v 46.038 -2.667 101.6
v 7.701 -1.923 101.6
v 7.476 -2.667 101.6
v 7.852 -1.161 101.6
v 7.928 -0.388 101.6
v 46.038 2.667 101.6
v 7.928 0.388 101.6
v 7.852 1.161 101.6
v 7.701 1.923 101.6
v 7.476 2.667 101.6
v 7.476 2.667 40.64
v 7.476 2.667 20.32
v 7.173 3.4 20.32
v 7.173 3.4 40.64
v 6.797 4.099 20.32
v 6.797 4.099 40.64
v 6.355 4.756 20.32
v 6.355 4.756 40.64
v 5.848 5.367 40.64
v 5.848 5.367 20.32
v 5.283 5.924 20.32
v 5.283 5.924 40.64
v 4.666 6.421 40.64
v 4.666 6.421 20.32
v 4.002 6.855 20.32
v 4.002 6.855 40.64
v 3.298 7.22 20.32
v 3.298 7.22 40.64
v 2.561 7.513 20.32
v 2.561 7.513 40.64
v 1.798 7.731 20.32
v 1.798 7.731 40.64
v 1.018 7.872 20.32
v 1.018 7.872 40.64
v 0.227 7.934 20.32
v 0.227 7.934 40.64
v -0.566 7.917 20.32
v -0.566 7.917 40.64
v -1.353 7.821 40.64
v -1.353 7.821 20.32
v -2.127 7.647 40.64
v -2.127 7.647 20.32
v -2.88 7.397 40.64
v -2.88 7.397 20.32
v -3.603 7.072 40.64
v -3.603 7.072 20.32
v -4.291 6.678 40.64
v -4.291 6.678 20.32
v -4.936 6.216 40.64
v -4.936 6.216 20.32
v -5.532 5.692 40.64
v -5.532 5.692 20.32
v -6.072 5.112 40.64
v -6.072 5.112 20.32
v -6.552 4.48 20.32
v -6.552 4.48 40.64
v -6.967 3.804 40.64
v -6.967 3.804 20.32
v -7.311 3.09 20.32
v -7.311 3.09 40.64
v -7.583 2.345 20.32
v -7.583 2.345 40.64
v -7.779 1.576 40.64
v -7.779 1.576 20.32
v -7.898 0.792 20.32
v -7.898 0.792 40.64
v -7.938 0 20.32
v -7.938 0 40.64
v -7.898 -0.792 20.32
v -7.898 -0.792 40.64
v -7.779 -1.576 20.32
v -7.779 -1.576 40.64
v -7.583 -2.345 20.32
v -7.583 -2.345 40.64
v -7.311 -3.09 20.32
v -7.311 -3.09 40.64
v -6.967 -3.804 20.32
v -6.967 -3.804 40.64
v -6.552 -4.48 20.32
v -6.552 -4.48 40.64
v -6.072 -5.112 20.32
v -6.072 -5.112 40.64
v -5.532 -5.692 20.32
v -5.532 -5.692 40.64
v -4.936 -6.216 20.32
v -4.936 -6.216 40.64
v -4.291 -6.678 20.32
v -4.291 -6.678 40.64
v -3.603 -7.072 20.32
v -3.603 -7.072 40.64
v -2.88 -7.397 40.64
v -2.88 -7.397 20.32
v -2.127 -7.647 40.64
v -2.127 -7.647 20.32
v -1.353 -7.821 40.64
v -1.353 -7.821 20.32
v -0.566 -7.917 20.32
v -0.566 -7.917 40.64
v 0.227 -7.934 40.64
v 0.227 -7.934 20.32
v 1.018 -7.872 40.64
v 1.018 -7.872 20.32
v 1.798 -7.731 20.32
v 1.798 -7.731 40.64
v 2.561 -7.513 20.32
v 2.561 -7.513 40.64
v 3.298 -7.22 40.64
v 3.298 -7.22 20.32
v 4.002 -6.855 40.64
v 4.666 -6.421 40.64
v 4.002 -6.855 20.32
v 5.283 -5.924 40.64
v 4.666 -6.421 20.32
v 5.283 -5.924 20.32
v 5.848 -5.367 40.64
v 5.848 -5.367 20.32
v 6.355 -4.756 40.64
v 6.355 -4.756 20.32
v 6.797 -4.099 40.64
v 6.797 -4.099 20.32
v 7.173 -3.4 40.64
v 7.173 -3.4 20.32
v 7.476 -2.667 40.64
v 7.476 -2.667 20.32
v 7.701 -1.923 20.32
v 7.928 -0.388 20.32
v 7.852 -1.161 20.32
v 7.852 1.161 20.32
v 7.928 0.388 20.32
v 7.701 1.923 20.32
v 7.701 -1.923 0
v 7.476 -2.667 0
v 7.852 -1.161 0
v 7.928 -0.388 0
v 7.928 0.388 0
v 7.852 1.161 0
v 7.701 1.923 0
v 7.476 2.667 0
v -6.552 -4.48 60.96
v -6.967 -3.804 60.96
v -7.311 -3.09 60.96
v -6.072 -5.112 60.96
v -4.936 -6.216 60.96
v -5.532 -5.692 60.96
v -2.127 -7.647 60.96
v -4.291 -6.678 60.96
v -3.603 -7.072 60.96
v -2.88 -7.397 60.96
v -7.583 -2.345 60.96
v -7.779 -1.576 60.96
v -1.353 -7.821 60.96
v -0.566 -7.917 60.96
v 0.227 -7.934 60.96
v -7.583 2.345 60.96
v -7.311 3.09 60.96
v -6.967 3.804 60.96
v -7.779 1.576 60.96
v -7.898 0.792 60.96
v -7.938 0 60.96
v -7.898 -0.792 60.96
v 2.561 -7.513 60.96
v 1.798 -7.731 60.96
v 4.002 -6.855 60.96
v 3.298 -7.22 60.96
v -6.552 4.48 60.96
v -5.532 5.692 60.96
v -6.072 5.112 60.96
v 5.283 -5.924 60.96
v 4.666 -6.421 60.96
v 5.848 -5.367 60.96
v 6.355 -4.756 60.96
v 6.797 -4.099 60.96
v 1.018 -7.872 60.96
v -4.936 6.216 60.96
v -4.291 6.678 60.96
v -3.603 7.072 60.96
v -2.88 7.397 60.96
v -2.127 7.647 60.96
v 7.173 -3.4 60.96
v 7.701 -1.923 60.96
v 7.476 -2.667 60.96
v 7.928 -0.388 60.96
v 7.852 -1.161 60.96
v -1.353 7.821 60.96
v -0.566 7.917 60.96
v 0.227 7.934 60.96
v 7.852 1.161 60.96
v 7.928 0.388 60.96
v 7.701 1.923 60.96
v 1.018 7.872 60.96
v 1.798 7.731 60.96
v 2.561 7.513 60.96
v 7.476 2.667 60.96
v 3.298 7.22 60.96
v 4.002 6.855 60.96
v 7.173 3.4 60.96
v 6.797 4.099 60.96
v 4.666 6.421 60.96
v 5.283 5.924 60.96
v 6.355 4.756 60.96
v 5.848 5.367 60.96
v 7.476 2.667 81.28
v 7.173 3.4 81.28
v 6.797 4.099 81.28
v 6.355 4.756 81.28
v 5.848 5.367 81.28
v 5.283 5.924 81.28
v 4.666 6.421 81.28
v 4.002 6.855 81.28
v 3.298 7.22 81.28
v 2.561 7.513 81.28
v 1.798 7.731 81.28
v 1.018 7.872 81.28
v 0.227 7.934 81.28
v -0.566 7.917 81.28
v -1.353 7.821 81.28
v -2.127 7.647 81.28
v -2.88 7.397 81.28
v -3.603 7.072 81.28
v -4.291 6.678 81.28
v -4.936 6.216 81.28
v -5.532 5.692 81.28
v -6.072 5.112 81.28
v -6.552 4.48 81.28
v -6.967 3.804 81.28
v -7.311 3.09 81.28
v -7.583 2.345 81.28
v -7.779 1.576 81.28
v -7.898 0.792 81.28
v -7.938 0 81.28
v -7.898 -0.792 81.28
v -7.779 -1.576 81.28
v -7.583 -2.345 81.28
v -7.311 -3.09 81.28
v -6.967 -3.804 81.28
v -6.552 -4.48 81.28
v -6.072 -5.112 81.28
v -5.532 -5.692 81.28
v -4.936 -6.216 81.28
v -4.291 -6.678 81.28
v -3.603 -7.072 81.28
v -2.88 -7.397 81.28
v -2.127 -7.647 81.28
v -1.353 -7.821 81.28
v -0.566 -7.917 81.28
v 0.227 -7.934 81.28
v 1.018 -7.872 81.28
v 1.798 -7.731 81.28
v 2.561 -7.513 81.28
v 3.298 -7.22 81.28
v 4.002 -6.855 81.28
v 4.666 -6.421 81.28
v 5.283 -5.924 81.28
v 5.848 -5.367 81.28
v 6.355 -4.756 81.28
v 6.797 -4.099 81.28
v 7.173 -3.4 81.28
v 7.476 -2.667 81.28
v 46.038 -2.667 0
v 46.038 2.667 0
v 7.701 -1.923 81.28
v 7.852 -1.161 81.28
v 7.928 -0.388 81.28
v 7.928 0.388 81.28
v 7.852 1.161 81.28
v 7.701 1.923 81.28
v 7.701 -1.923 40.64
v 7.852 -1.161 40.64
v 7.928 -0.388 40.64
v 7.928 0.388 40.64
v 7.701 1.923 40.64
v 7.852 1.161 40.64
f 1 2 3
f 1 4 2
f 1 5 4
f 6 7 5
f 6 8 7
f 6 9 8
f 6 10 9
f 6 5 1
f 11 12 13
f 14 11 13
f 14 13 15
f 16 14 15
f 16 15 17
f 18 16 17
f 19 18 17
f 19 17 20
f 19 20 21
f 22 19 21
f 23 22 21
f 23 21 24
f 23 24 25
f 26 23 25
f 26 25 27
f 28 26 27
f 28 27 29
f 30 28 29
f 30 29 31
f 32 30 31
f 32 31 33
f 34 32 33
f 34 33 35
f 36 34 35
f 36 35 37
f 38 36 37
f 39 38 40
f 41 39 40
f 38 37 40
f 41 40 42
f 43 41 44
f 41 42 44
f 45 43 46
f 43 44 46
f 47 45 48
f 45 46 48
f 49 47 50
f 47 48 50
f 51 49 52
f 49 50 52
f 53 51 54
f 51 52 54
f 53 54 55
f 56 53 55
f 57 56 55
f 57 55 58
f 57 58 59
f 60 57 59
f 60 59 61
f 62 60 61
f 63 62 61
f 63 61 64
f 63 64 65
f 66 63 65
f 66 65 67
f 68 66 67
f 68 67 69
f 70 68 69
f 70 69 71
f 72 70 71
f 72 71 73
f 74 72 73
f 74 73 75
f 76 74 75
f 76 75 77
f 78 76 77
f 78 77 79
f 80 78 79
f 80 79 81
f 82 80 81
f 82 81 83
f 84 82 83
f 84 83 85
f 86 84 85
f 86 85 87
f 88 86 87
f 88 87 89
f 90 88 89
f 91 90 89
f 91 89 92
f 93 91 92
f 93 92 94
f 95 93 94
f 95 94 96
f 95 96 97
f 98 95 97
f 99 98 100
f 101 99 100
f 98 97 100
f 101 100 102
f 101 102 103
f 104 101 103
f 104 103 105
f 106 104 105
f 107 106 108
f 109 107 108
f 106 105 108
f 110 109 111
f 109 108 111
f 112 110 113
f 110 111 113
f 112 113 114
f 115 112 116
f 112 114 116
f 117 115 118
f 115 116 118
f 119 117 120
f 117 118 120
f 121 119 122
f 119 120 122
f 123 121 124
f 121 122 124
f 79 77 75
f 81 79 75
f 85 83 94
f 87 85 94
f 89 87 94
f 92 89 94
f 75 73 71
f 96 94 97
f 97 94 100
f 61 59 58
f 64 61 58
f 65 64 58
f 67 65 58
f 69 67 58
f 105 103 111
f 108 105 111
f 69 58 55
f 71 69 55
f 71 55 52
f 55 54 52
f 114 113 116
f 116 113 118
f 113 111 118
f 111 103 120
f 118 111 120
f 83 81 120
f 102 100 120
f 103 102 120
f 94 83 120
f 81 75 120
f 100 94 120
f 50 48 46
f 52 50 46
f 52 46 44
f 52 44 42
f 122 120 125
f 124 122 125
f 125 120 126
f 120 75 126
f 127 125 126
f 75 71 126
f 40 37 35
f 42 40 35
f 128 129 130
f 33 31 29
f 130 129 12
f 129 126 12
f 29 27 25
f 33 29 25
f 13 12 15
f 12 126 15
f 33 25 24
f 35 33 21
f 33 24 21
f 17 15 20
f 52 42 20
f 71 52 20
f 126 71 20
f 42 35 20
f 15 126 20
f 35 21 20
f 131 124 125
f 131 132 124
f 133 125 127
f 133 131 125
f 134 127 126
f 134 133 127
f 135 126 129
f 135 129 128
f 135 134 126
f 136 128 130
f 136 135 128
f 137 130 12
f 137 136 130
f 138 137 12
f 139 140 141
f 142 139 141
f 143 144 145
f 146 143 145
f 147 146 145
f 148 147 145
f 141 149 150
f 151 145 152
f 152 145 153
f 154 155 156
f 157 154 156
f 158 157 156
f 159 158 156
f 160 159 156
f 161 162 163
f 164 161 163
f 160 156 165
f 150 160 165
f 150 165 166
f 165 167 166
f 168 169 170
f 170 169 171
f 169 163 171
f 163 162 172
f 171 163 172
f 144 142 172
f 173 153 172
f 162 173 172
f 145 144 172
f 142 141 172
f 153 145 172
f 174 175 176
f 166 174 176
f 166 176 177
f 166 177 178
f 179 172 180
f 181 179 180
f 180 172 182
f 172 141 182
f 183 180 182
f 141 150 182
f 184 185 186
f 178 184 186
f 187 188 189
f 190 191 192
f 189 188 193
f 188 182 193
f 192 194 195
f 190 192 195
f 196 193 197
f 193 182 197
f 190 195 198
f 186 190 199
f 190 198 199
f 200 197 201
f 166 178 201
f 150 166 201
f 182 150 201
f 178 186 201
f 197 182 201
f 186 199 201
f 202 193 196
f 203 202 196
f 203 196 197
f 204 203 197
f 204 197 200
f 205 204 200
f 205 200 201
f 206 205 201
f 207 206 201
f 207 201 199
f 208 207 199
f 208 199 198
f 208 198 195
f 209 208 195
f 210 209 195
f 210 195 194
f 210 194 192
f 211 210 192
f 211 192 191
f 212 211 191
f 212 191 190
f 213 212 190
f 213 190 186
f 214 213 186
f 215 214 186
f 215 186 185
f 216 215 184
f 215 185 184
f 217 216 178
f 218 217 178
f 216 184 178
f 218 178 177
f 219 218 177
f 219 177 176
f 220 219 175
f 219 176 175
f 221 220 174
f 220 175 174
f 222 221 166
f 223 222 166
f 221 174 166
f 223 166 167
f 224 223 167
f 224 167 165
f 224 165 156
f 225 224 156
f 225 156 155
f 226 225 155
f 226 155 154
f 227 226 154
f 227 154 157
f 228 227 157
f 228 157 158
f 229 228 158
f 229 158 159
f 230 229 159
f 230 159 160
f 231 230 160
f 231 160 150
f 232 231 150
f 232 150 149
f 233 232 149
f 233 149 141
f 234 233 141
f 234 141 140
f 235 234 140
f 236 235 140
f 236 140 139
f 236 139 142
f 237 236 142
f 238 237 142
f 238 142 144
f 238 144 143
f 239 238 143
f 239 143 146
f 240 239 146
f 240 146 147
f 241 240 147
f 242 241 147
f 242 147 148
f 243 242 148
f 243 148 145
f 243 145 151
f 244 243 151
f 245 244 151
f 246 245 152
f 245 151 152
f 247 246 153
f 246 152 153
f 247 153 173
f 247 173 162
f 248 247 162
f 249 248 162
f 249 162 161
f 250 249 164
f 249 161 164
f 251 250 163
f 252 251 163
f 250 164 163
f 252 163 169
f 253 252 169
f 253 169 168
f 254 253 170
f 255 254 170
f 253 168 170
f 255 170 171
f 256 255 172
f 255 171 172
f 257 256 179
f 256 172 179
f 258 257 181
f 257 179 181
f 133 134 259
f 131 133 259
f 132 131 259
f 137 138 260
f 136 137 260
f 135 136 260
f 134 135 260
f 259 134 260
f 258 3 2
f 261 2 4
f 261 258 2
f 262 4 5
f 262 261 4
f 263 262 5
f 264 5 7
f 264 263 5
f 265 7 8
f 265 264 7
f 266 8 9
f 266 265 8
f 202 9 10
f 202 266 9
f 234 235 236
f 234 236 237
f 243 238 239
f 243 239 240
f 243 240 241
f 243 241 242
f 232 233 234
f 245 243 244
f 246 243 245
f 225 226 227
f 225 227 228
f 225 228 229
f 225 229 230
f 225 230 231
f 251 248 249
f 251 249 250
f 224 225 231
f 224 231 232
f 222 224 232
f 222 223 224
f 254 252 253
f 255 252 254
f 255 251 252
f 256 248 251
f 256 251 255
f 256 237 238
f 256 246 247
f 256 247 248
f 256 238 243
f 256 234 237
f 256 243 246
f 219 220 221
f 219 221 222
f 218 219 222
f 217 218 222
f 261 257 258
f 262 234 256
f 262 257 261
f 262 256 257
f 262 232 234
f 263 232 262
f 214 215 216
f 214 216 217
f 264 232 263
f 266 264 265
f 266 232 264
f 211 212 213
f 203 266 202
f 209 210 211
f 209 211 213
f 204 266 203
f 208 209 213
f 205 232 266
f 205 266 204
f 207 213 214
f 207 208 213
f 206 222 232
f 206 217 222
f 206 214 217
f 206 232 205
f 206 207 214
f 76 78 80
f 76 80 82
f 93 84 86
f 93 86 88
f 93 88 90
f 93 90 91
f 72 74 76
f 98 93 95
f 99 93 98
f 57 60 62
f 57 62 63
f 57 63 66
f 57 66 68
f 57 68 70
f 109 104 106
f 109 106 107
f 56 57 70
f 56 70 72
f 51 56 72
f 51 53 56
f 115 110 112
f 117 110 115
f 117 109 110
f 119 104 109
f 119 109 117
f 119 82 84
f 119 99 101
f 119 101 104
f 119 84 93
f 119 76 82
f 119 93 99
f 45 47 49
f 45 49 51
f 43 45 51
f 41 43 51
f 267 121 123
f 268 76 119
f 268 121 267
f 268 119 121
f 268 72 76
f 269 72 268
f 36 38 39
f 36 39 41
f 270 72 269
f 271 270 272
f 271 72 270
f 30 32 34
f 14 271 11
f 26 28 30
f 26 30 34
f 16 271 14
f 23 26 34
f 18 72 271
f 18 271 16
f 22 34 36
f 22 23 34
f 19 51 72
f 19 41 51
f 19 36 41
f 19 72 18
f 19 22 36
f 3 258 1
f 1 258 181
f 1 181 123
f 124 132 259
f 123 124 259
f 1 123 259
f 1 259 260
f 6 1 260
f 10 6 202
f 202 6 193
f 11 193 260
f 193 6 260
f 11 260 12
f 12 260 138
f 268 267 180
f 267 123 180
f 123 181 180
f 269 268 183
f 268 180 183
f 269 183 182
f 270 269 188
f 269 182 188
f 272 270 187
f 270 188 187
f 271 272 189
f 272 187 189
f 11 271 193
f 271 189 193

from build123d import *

# Parameters (mm, degrees)
BOSS_EXTRUDE1_DEPTH = 101.6
CUT_EXTRUDE1_DEPTH  = 20.32
CUT_EXTRUDE2_START  = 40.64
CUT_EXTRUDE2_DEPTH  = 20.32
CUT_EXTRUDE3_START  = 81.28
CUT_EXTRUDE3_DEPTH  = 20.32


with BuildPart() as part:
    # Sketch1 → Boss-Extrude1 (new body)
    with BuildSketch(Plane.XY):
        with BuildLine():
            Line((46.0375, 2.667), (7.476029511, 2.667))
            ThreePointArc((7.476029511, 2.667), (-7.9375, 0), (7.476029511, -2.667))
            Line((7.476029511, -2.667), (46.0375, -2.667))
            Line((46.0375, -2.667), (46.0375, 2.667))
        make_face()
    extrude(amount=BOSS_EXTRUDE1_DEPTH)

    # Sketch1_3 → Cut-Extrude1 (cut)
    with BuildSketch(Plane.XY):
        with BuildLine():
            ThreePointArc((7.476029511, 2.667), (-7.9375, 0), (7.476029511, -2.667))
            ThreePointArc((7.476029511, -2.667), (7.82128156, -1.35331482), (7.9375, 0))
            ThreePointArc((7.9375, 0), (7.82128156, 1.35331482), (7.476029511, 2.667))
        make_face()
    extrude(amount=CUT_EXTRUDE1_DEPTH, mode=Mode.SUBTRACT)

    # Sketch1_5 → Cut-Extrude2 (cut)
    with BuildSketch(Plane.XY.offset(CUT_EXTRUDE2_START)):
        with BuildLine():
            ThreePointArc((7.476029511, 2.667), (-7.9375, 0), (7.476029511, -2.667))
            ThreePointArc((7.476029511, -2.667), (7.82128156, -1.35331482), (7.9375, 0))
            ThreePointArc((7.9375, 0), (7.82128156, 1.35331482), (7.476029511, 2.667))
        make_face()
    extrude(amount=CUT_EXTRUDE2_DEPTH, mode=Mode.SUBTRACT)

    # Sketch1_6 → Cut-Extrude3 (cut)
    with BuildSketch(Plane.XY.offset(CUT_EXTRUDE3_START)):
        with BuildLine():
            ThreePointArc((7.476029511, 2.667), (-7.9375, 0), (7.476029511, -2.667))
            ThreePointArc((7.476029511, -2.667), (7.82128156, -1.35331482), (7.9375, 0))
            ThreePointArc((7.9375, 0), (7.82128156, 1.35331482), (7.476029511, 2.667))
        make_face()
    extrude(amount=CUT_EXTRUDE3_DEPTH, mode=Mode.SUBTRACT)


solid = part.part
